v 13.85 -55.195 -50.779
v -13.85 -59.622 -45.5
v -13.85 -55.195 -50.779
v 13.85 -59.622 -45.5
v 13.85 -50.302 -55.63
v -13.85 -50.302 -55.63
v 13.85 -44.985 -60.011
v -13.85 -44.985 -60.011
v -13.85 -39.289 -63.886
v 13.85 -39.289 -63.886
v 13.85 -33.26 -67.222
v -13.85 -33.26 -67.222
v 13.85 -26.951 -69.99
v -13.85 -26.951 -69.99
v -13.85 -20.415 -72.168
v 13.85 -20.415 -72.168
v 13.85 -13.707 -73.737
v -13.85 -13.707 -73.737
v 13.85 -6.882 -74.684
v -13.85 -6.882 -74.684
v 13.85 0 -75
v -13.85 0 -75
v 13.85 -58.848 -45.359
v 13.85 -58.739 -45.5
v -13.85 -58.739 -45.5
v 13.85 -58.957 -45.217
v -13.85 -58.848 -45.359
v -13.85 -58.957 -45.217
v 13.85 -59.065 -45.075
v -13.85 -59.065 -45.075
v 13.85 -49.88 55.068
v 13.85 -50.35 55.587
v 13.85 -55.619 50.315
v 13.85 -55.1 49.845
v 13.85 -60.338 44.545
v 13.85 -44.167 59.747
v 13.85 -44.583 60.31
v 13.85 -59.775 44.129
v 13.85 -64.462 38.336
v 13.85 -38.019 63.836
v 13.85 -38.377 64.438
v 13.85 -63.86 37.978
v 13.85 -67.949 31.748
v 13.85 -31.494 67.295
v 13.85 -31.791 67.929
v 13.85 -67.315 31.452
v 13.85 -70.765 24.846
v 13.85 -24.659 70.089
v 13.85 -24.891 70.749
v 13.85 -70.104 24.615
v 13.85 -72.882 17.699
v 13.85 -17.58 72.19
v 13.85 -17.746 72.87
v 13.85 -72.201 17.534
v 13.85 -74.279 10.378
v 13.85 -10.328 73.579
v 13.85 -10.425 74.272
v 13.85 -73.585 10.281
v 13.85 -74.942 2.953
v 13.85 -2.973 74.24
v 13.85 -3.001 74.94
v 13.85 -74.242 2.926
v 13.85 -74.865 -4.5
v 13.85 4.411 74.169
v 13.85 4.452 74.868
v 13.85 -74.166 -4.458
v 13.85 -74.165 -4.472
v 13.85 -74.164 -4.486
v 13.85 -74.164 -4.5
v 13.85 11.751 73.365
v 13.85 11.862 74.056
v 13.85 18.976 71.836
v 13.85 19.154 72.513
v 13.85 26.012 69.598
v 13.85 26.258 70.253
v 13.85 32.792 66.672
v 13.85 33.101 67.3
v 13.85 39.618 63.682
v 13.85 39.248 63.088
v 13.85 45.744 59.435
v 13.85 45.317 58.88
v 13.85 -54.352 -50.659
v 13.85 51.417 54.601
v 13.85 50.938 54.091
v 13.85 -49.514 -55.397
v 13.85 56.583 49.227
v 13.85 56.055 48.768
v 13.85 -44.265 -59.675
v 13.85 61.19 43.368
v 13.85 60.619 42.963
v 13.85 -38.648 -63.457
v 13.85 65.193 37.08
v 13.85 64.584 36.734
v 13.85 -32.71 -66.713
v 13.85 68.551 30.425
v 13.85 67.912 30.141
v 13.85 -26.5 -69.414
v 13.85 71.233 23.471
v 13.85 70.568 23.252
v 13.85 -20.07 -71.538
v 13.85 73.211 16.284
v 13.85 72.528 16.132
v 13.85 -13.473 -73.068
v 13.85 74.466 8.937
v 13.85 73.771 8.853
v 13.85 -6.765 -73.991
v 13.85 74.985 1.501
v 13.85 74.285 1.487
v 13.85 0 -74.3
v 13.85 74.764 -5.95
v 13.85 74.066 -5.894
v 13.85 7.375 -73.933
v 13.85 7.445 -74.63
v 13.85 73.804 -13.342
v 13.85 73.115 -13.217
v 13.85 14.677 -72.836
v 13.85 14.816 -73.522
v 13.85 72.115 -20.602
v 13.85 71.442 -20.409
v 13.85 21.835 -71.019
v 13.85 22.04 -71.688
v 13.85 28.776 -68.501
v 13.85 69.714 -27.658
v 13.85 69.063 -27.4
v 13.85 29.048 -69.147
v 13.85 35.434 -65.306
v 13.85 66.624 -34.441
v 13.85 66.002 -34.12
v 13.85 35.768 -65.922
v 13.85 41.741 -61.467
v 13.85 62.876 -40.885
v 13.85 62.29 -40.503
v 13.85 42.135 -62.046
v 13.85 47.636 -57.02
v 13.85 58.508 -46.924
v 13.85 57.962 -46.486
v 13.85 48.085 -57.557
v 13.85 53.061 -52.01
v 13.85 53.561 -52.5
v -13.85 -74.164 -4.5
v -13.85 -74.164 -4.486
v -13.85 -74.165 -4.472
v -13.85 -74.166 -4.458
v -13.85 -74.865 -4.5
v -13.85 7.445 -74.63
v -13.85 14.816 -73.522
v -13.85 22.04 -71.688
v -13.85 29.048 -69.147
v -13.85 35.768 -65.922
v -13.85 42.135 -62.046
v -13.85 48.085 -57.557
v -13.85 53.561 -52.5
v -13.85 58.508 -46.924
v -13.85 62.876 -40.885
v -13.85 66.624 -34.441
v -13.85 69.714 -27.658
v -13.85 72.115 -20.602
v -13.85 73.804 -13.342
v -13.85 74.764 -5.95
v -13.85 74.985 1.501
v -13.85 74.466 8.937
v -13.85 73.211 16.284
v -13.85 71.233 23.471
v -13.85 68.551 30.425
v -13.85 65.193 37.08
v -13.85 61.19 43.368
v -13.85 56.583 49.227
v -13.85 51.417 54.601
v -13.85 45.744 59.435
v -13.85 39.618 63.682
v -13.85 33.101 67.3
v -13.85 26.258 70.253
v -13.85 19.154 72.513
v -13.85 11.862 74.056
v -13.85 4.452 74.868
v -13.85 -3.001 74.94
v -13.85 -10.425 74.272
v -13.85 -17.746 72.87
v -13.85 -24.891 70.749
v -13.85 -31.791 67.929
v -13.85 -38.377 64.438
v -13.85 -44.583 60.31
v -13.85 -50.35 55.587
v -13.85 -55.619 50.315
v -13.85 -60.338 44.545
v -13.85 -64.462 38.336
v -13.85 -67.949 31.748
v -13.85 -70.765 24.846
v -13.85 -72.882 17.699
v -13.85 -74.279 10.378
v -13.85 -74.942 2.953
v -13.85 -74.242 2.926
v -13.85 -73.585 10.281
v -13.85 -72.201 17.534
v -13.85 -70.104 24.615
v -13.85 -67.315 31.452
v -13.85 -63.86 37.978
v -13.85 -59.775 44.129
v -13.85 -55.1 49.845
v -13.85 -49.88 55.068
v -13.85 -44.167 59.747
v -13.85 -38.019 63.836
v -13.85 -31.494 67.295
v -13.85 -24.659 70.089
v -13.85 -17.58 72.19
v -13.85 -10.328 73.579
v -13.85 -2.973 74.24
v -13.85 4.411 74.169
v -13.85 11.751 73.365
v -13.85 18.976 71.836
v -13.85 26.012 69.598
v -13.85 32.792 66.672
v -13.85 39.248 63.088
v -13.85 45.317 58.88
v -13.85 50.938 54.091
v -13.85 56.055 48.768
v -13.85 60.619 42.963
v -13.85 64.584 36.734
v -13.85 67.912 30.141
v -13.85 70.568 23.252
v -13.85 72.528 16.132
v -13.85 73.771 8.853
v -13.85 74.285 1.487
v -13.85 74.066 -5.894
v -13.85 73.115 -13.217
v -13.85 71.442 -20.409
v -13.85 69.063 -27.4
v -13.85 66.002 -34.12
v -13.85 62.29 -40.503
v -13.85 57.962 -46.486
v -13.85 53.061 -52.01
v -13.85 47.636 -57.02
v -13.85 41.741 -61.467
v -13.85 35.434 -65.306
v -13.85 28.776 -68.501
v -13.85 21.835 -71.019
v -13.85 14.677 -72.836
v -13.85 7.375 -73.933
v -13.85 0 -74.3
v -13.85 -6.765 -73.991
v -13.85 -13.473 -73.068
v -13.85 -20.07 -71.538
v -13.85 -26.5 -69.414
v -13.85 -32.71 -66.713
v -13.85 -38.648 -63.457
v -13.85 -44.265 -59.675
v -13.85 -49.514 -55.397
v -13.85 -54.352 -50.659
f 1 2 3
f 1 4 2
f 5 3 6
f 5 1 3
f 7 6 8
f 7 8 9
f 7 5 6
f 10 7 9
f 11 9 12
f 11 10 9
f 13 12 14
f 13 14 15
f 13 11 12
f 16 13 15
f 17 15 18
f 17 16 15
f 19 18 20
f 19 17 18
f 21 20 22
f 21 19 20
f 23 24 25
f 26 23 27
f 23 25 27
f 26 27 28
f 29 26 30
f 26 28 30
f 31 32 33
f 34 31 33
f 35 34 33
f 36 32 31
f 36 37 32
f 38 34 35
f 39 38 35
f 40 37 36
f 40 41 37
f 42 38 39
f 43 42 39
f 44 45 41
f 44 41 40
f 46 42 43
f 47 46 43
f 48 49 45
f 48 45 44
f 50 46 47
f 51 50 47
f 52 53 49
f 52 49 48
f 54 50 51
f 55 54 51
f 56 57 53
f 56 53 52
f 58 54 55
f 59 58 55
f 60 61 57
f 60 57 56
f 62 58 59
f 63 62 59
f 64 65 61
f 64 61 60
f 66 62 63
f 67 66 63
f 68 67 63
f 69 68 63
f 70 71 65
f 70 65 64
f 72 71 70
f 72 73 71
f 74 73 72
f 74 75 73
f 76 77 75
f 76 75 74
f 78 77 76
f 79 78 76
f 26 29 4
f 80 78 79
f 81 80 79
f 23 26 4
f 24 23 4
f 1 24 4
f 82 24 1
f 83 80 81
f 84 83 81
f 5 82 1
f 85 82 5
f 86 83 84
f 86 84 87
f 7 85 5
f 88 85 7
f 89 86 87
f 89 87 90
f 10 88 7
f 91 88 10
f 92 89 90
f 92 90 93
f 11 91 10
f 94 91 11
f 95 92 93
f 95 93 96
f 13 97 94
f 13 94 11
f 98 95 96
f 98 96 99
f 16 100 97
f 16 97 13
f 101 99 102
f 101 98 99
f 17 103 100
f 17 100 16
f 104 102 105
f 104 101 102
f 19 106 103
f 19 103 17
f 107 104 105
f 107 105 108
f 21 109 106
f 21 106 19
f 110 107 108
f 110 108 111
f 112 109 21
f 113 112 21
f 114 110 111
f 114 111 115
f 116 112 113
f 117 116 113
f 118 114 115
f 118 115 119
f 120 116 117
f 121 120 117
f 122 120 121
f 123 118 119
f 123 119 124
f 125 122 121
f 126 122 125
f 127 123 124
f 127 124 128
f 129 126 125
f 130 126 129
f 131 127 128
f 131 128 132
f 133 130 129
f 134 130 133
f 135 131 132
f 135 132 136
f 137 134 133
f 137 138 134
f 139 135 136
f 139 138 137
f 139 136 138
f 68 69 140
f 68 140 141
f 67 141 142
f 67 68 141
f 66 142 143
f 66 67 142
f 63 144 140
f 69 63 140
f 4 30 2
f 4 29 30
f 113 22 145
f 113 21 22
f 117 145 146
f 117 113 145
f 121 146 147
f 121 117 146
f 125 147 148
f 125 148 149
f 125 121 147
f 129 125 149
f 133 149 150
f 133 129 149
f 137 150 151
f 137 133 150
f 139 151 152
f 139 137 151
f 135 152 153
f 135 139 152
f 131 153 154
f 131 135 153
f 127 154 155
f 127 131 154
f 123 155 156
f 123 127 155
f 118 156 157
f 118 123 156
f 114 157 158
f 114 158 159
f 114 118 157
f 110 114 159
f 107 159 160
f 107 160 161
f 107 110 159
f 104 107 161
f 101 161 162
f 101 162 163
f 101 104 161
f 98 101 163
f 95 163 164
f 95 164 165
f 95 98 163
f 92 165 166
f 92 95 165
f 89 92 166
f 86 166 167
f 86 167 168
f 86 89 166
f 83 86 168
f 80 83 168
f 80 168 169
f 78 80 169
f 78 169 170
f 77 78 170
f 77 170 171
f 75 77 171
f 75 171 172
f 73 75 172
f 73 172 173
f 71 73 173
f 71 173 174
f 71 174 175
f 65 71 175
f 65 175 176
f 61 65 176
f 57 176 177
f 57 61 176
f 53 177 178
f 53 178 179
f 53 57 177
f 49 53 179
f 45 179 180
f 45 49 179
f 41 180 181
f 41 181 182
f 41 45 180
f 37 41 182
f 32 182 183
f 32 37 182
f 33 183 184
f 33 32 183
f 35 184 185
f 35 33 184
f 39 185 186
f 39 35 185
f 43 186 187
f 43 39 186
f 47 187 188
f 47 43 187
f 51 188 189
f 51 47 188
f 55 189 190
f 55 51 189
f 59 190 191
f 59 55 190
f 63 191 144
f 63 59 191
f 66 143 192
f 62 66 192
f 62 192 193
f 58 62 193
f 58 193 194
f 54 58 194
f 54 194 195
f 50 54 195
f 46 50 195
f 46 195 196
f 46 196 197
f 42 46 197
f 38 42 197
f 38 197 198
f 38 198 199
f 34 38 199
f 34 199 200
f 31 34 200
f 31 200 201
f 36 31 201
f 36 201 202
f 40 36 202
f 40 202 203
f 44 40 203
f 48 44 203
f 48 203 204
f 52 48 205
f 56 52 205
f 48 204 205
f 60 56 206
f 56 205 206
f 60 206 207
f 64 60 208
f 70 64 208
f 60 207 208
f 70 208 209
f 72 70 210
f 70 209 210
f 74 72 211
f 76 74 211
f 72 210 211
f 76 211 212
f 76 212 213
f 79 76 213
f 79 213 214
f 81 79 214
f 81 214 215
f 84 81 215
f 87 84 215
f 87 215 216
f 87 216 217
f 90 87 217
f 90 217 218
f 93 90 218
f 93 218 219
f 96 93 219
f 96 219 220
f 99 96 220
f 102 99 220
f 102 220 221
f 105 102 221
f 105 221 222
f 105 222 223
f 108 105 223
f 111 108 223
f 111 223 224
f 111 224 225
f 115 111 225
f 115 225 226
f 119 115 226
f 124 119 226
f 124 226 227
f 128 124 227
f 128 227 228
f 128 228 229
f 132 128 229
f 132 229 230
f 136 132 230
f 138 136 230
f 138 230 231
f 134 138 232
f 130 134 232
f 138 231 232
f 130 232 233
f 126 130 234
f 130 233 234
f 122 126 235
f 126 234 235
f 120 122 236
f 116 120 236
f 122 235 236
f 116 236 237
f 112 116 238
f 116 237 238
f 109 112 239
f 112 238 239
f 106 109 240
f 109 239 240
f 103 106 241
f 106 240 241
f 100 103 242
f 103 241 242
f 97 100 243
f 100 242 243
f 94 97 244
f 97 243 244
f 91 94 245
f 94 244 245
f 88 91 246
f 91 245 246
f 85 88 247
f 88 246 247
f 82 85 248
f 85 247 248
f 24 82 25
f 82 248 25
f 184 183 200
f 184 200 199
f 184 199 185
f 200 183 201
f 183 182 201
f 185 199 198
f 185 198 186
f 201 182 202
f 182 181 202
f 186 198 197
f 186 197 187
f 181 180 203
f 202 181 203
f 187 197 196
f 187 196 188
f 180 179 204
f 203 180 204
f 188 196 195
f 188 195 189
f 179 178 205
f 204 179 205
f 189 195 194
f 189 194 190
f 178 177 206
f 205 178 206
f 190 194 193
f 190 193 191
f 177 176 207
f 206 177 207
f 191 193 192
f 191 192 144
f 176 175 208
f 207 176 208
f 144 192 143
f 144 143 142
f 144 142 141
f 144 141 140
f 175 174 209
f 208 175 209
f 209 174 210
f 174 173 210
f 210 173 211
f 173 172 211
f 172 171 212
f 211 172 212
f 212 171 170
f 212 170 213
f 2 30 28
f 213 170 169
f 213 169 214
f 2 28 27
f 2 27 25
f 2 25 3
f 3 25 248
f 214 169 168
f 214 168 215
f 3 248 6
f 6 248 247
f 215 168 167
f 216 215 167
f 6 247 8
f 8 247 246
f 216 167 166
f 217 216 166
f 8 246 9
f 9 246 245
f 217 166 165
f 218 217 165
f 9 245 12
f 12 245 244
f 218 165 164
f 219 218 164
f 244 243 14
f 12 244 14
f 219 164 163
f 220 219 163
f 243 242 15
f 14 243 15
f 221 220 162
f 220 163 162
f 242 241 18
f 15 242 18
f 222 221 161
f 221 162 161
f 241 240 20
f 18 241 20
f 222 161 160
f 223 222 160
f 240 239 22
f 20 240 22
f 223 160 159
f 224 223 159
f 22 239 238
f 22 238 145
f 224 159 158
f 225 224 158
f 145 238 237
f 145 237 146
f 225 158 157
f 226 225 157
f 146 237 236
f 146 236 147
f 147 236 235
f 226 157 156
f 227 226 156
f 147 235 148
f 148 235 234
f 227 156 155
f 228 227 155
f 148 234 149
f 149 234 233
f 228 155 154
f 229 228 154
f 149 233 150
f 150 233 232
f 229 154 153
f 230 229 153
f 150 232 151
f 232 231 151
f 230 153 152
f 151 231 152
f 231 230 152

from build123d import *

# Parameters (mm, degrees)
BOSS_EXTRUDE1_DEPTH = 13.85


with BuildPart() as part:
    # Sketch1 → Boss-Extrude1 (new, symmetric)
    with BuildSketch(Plane(origin=(0, 0, 0), x_dir=(0, 0, -1), z_dir=(1, 0, 0))):
        with BuildLine():
            ThreePointArc((75, 0), (-54.60082417, 51.417409503), (4.5, -74.864878281))
            Line((4.5, -74.864878281), (4.458, -74.166139417))
            ThreePointArc((4.458, -74.166139417), (-54.091216477, 50.937513681), (74.3, 0))
            ThreePointArc((74.3, 0), (66.712592514, -32.709631609), (45.5, -58.738743602))
            Line((45.5, -58.738743602), (45.5, -59.621724229))
            ThreePointArc((45.5, -59.621724229), (67.221648299, -33.260336739), (75, 0))
        make_face()
        with BuildLine():
            Line((4.458, -74.166139417), (4.5, -74.864878281))
            Line((4.5, -74.864878281), (4.5, -74.163602933))
            ThreePointArc((4.5, -74.163602933), (4.47900018, -74.164874148), (4.458, -74.166139417))
        make_face()
        with BuildLine():
            Line((45.075333333, -59.065254803), (45.5, -59.621724229))
            Line((45.5, -59.621724229), (45.5, -58.738743602))
            ThreePointArc((45.5, -58.738743602), (45.287960922, -58.902381917), (45.075333333, -59.065254803))
        make_face()
    extrude(amount=BOSS_EXTRUDE1_DEPTH, both=True)


solid = part.part
